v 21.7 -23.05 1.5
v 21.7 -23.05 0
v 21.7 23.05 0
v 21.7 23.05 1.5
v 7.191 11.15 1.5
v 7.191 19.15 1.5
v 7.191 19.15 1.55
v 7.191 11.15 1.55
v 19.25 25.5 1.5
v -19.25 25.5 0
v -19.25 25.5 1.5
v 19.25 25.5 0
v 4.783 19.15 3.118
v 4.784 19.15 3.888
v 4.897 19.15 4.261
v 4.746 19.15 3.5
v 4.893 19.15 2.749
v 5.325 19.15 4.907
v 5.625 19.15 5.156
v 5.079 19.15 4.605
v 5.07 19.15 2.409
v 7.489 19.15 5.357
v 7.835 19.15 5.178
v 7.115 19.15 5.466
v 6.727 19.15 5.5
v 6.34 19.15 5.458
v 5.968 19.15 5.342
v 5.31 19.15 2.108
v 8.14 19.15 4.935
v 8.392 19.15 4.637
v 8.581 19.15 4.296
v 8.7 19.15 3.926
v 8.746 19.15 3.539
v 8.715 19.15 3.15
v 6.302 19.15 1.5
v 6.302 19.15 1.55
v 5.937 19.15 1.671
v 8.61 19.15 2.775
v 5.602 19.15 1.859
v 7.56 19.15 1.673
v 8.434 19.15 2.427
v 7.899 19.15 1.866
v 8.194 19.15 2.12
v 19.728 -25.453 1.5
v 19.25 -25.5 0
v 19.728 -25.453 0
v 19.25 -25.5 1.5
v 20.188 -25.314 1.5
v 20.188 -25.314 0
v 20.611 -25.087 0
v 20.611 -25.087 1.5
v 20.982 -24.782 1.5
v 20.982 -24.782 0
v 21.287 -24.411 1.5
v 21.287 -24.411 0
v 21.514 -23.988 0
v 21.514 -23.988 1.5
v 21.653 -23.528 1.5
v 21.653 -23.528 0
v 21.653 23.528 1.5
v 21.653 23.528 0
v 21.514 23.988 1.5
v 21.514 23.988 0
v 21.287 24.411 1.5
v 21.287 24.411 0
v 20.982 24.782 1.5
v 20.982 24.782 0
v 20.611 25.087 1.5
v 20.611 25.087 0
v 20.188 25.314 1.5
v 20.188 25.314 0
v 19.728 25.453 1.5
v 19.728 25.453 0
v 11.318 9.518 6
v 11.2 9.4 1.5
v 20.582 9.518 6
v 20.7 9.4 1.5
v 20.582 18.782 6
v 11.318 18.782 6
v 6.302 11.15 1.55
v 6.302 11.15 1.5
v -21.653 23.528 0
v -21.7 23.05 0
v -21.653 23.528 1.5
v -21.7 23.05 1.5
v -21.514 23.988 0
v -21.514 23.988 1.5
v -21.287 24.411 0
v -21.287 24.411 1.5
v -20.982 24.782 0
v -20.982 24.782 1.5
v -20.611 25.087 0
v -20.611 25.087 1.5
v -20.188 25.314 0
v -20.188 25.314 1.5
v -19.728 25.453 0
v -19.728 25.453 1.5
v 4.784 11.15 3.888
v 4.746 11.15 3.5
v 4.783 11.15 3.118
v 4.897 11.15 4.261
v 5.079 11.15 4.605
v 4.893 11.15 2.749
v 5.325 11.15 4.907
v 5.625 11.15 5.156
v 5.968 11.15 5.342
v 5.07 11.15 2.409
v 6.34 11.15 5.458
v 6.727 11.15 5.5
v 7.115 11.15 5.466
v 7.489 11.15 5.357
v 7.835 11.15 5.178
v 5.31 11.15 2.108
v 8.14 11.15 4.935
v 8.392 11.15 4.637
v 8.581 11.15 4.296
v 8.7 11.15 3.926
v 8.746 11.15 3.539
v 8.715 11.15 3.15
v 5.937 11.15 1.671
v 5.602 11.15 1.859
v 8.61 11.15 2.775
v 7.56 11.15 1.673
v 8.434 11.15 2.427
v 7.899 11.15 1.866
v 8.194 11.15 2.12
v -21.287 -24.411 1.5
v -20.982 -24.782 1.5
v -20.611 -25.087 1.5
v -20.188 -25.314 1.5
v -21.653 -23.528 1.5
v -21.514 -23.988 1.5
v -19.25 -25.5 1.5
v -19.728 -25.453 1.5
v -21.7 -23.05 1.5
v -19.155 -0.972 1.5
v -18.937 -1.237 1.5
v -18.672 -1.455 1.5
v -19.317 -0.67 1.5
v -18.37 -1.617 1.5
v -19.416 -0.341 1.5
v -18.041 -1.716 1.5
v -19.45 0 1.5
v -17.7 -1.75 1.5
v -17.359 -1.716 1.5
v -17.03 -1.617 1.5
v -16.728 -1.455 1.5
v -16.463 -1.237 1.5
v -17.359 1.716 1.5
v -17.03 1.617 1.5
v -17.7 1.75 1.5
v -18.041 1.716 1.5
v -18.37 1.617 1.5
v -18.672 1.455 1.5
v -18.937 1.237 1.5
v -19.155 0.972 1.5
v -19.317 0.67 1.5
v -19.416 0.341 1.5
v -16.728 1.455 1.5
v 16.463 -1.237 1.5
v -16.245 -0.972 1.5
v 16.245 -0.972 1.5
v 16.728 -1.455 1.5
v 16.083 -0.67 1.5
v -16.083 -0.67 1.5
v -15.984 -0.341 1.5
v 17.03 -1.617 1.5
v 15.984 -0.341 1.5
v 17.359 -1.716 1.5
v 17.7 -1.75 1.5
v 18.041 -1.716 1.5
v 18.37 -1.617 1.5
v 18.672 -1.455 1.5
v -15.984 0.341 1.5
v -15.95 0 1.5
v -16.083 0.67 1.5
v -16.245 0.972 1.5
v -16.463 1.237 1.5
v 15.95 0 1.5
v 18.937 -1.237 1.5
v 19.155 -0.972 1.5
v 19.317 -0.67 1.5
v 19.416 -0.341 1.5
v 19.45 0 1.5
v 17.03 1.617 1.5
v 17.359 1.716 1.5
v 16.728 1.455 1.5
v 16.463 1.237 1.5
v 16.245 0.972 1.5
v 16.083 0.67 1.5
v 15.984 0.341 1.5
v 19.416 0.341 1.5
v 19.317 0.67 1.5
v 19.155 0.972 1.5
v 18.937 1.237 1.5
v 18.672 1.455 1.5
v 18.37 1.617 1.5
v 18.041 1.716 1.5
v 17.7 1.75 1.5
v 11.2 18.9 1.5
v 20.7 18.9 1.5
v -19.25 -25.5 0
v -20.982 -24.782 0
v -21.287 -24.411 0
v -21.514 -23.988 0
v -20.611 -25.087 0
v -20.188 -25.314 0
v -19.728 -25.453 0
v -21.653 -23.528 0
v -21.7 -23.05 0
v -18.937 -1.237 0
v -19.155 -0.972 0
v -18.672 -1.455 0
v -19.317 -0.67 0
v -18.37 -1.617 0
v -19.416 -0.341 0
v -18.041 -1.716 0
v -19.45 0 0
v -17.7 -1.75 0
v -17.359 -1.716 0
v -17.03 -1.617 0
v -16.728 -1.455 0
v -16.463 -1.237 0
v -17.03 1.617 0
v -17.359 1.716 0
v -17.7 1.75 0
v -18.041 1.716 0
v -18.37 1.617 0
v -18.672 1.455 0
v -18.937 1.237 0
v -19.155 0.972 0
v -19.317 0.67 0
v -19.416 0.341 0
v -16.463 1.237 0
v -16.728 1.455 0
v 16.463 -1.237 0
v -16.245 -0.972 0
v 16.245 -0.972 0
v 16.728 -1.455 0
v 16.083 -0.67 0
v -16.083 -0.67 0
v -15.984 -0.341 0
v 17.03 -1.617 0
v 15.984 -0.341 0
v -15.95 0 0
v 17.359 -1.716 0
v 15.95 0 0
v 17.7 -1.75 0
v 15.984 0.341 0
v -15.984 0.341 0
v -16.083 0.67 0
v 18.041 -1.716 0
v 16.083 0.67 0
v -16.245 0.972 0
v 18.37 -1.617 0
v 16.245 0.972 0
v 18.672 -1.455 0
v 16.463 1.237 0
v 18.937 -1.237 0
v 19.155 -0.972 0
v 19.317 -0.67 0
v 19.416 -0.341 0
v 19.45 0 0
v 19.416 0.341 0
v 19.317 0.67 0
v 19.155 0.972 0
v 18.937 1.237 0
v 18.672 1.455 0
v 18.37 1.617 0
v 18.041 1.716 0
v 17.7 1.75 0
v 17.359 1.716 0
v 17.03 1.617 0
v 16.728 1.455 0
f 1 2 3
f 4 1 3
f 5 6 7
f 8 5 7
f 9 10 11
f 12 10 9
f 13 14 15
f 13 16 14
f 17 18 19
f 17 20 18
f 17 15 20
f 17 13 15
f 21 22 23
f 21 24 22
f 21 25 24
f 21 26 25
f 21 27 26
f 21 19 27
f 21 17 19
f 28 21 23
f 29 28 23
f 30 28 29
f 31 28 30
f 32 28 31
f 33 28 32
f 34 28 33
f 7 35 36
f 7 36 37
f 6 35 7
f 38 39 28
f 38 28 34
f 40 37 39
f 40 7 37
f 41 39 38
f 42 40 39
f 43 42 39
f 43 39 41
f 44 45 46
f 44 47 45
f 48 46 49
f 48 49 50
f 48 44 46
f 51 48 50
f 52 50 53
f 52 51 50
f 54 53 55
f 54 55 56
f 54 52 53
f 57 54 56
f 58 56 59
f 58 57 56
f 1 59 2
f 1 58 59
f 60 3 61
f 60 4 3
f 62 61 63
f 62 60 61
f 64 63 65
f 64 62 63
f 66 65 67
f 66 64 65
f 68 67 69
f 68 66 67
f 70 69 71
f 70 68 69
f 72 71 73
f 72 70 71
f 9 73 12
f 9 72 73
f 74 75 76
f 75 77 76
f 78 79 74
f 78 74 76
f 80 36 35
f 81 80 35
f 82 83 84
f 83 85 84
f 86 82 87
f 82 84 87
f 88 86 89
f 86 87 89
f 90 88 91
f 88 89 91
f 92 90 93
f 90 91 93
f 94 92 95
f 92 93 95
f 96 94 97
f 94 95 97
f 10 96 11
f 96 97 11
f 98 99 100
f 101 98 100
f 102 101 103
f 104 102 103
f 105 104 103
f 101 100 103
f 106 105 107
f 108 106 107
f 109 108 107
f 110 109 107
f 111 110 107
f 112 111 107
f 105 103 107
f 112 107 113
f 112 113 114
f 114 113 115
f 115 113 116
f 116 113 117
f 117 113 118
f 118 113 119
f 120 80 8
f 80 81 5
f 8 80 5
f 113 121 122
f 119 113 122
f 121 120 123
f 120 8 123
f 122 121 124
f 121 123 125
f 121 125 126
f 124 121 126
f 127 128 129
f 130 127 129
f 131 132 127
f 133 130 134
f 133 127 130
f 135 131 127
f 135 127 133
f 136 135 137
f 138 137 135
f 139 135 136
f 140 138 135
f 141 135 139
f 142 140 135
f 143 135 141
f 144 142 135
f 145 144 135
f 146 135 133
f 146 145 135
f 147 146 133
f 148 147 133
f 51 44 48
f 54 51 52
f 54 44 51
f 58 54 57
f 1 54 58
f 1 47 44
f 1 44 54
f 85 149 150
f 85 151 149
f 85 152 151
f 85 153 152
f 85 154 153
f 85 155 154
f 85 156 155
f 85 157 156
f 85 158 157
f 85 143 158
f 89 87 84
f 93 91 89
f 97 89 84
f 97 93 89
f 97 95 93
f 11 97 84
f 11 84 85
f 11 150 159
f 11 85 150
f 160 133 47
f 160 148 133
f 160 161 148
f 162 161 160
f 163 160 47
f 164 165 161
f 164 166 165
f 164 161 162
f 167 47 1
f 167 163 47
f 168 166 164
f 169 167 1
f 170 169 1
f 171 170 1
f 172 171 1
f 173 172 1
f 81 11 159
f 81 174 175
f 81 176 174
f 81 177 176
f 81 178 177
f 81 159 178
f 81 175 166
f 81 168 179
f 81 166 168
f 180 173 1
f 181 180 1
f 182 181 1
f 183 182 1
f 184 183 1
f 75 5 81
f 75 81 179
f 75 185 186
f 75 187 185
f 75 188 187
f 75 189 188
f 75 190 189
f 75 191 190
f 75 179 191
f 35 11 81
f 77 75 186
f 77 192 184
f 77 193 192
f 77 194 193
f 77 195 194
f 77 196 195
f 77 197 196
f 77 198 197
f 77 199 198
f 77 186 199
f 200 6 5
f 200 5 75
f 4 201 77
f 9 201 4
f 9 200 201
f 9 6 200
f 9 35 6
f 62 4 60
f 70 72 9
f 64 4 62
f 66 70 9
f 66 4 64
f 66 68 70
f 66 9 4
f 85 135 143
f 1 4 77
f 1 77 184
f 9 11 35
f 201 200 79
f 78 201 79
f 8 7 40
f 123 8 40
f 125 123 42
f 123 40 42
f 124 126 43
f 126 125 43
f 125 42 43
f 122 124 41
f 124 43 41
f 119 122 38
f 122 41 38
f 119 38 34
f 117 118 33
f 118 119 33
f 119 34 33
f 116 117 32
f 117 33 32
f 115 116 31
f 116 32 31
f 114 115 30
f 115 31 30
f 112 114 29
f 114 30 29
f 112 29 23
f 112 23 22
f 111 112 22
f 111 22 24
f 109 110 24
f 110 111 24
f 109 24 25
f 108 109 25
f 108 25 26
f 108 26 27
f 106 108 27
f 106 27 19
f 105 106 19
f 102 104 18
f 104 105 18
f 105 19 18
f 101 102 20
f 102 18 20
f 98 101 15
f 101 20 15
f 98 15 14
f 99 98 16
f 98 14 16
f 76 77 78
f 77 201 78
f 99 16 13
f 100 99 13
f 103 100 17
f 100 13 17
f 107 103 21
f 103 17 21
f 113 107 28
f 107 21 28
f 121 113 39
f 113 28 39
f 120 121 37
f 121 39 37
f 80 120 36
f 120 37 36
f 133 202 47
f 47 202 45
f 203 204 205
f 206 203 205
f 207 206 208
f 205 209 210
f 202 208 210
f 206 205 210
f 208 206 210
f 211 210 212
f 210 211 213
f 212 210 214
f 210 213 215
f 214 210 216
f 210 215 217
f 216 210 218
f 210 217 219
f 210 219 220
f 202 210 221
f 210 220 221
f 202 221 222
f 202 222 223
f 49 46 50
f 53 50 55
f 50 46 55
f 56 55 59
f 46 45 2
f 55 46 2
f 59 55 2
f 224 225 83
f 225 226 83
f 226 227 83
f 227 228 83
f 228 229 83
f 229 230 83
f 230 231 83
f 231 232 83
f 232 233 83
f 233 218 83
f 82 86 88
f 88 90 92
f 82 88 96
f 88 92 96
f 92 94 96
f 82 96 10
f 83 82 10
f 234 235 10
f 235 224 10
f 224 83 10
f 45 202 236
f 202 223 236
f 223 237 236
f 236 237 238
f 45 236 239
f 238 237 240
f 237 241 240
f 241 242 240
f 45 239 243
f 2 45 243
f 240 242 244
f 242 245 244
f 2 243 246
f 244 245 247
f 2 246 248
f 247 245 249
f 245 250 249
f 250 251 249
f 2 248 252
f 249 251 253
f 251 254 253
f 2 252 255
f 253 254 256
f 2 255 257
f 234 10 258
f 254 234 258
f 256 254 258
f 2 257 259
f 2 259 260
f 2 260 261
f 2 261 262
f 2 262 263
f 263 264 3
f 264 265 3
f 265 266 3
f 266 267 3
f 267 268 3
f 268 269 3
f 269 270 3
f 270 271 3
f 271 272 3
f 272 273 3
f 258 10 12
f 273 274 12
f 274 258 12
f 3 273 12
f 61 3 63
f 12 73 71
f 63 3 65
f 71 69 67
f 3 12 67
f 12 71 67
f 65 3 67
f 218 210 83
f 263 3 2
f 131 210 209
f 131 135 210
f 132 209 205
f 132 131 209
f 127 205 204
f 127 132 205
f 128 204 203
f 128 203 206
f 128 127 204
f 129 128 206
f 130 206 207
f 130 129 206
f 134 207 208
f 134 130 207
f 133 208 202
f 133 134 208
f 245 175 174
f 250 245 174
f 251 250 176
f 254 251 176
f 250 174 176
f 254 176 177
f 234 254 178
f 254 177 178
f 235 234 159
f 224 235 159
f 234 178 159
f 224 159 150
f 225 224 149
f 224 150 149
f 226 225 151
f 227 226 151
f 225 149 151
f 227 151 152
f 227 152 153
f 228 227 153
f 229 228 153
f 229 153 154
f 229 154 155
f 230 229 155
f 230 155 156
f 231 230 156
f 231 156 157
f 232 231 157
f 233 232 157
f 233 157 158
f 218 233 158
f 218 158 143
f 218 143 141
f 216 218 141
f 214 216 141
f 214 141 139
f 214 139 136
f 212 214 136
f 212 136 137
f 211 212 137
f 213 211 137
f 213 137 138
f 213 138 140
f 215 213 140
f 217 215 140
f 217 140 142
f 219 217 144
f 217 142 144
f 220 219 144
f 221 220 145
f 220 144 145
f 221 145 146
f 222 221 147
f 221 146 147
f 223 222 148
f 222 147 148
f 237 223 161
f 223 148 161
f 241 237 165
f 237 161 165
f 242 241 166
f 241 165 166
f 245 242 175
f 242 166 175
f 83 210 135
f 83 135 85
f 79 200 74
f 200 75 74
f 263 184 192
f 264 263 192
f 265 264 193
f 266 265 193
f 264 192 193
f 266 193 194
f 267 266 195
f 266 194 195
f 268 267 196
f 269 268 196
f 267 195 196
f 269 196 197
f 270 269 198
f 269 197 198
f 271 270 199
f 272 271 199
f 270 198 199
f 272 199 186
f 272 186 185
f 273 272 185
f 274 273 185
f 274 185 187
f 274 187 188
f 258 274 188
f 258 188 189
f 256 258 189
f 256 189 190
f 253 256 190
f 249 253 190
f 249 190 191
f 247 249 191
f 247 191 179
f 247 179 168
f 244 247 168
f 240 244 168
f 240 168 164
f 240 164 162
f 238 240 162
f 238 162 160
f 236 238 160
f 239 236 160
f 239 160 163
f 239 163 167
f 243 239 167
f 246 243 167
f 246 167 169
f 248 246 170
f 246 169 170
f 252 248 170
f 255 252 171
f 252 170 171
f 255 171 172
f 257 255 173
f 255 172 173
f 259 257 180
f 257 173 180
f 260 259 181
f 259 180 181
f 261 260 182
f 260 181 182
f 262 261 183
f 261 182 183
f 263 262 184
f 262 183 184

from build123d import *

# Parameters (mm, degrees)
F0_W      = 43.4
F0_H      = 51
F1_DEPTH  = 1.5
F2_R      = 2.45
F3_R      = 1.75
F4_DEPTH  = 1.501
F5_W      = 9.5
F5_H      = 9.5
F6_DEPTH  = 4.5
F6_TAPER  = 1.5
F7_W      = 7.85
F7_H      = 4.95
F8_DEPTH  = 8.5
F9_W      = 4.25
F9_H      = 8
F10_DEPTH = 4.15
F12_DEPTH = 44.651
F13_DEPTH = 8.5


with BuildPart() as f1:
    # F0 (on Top) → F1 (new body)
    with BuildSketch(Plane.XY):
        Rectangle(F0_W, F0_H)
    extrude(amount=F1_DEPTH)

    # F2
    f2_edges = [f1.edges().sort_by_distance(p)[0] for p in [
        (-21.7, 25.5, 0.75),
        (21.7, 25.5, 0.75),
        (21.7, -25.5, 0.75),
        (-21.7, -25.5, 0.75),
    ]]
    fillet(f2_edges, radius=F2_R)

    # F3 (on face) → F4 (cut, through all)
    with BuildSketch(Plane.XY.offset(1.5)):
        with Locations((-17.7, 0)):
            Circle(F3_R)
        with Locations((17.7, 0)):
            Circle(F3_R)
    extrude(amount=-F4_DEPTH, mode=Mode.SUBTRACT)

    # F5 (on face) → F6 (join)
    with BuildSketch(Plane.XY.offset(1.5)):
        with Locations((15.95, 14.15)):
            Rectangle(F5_W, F5_H)
    extrude(amount=F6_DEPTH, taper=F6_TAPER)

    # F7 (on face) → F8 (join)
    with BuildSketch(Plane.XY.offset(1.5)):
        with Locations((-15.775, -20.075)):
            Rectangle(F7_W, F7_H)
    extrude(amount=F8_DEPTH)

    # F9 (on face) → F10 (join)
    with BuildSketch(Plane.XY.offset(1.5)):
        with Locations((6.725, 15.15)):
            Rectangle(F9_W, F9_H)
    extrude(amount=F10_DEPTH)

    # F11 (on face) → F12 (cut, through all)
    with BuildSketch(Plane(origin=(0, 19.15, 0), x_dir=(-1, 0, 0), z_dir=(0, 1, 0))):
        with BuildLine():
            ThreePointArc((-7.190682743, 1.55), (-7.9935060714, 5.0634608153), (-4.7462730221, 3.5))
            ThreePointArc((-4.7462730221, 3.5), (-5.1828122069, 2.2527669508), (-6.3018633013, 1.55))
            Line((-6.3018633013, 1.55), (-6.3018633013, 1.5))
            Line((-6.3018633013, 1.5), (-4.6, 1.5))
            Line((-4.6, 1.5), (-4.6, 5.65))
            Line((-4.6, 5.65), (-8.85, 5.65))
            Line((-8.85, 5.65), (-8.85, 1.5))
            Line((-8.85, 1.5), (-7.190682743, 1.5))
            Line((-7.190682743, 1.5), (-7.190682743, 1.55))
        make_face()
    extrude(amount=-F12_DEPTH, mode=Mode.SUBTRACT)

    # F13 (cut, through all): a face of the model
    f13_faces = [f1.faces().sort_by_distance(p)[0] for p in [
        (-15.775, -20.075, 10),
    ]]
    extrude(f13_faces, amount=-F13_DEPTH, mode=Mode.SUBTRACT)


solid = f1.part
